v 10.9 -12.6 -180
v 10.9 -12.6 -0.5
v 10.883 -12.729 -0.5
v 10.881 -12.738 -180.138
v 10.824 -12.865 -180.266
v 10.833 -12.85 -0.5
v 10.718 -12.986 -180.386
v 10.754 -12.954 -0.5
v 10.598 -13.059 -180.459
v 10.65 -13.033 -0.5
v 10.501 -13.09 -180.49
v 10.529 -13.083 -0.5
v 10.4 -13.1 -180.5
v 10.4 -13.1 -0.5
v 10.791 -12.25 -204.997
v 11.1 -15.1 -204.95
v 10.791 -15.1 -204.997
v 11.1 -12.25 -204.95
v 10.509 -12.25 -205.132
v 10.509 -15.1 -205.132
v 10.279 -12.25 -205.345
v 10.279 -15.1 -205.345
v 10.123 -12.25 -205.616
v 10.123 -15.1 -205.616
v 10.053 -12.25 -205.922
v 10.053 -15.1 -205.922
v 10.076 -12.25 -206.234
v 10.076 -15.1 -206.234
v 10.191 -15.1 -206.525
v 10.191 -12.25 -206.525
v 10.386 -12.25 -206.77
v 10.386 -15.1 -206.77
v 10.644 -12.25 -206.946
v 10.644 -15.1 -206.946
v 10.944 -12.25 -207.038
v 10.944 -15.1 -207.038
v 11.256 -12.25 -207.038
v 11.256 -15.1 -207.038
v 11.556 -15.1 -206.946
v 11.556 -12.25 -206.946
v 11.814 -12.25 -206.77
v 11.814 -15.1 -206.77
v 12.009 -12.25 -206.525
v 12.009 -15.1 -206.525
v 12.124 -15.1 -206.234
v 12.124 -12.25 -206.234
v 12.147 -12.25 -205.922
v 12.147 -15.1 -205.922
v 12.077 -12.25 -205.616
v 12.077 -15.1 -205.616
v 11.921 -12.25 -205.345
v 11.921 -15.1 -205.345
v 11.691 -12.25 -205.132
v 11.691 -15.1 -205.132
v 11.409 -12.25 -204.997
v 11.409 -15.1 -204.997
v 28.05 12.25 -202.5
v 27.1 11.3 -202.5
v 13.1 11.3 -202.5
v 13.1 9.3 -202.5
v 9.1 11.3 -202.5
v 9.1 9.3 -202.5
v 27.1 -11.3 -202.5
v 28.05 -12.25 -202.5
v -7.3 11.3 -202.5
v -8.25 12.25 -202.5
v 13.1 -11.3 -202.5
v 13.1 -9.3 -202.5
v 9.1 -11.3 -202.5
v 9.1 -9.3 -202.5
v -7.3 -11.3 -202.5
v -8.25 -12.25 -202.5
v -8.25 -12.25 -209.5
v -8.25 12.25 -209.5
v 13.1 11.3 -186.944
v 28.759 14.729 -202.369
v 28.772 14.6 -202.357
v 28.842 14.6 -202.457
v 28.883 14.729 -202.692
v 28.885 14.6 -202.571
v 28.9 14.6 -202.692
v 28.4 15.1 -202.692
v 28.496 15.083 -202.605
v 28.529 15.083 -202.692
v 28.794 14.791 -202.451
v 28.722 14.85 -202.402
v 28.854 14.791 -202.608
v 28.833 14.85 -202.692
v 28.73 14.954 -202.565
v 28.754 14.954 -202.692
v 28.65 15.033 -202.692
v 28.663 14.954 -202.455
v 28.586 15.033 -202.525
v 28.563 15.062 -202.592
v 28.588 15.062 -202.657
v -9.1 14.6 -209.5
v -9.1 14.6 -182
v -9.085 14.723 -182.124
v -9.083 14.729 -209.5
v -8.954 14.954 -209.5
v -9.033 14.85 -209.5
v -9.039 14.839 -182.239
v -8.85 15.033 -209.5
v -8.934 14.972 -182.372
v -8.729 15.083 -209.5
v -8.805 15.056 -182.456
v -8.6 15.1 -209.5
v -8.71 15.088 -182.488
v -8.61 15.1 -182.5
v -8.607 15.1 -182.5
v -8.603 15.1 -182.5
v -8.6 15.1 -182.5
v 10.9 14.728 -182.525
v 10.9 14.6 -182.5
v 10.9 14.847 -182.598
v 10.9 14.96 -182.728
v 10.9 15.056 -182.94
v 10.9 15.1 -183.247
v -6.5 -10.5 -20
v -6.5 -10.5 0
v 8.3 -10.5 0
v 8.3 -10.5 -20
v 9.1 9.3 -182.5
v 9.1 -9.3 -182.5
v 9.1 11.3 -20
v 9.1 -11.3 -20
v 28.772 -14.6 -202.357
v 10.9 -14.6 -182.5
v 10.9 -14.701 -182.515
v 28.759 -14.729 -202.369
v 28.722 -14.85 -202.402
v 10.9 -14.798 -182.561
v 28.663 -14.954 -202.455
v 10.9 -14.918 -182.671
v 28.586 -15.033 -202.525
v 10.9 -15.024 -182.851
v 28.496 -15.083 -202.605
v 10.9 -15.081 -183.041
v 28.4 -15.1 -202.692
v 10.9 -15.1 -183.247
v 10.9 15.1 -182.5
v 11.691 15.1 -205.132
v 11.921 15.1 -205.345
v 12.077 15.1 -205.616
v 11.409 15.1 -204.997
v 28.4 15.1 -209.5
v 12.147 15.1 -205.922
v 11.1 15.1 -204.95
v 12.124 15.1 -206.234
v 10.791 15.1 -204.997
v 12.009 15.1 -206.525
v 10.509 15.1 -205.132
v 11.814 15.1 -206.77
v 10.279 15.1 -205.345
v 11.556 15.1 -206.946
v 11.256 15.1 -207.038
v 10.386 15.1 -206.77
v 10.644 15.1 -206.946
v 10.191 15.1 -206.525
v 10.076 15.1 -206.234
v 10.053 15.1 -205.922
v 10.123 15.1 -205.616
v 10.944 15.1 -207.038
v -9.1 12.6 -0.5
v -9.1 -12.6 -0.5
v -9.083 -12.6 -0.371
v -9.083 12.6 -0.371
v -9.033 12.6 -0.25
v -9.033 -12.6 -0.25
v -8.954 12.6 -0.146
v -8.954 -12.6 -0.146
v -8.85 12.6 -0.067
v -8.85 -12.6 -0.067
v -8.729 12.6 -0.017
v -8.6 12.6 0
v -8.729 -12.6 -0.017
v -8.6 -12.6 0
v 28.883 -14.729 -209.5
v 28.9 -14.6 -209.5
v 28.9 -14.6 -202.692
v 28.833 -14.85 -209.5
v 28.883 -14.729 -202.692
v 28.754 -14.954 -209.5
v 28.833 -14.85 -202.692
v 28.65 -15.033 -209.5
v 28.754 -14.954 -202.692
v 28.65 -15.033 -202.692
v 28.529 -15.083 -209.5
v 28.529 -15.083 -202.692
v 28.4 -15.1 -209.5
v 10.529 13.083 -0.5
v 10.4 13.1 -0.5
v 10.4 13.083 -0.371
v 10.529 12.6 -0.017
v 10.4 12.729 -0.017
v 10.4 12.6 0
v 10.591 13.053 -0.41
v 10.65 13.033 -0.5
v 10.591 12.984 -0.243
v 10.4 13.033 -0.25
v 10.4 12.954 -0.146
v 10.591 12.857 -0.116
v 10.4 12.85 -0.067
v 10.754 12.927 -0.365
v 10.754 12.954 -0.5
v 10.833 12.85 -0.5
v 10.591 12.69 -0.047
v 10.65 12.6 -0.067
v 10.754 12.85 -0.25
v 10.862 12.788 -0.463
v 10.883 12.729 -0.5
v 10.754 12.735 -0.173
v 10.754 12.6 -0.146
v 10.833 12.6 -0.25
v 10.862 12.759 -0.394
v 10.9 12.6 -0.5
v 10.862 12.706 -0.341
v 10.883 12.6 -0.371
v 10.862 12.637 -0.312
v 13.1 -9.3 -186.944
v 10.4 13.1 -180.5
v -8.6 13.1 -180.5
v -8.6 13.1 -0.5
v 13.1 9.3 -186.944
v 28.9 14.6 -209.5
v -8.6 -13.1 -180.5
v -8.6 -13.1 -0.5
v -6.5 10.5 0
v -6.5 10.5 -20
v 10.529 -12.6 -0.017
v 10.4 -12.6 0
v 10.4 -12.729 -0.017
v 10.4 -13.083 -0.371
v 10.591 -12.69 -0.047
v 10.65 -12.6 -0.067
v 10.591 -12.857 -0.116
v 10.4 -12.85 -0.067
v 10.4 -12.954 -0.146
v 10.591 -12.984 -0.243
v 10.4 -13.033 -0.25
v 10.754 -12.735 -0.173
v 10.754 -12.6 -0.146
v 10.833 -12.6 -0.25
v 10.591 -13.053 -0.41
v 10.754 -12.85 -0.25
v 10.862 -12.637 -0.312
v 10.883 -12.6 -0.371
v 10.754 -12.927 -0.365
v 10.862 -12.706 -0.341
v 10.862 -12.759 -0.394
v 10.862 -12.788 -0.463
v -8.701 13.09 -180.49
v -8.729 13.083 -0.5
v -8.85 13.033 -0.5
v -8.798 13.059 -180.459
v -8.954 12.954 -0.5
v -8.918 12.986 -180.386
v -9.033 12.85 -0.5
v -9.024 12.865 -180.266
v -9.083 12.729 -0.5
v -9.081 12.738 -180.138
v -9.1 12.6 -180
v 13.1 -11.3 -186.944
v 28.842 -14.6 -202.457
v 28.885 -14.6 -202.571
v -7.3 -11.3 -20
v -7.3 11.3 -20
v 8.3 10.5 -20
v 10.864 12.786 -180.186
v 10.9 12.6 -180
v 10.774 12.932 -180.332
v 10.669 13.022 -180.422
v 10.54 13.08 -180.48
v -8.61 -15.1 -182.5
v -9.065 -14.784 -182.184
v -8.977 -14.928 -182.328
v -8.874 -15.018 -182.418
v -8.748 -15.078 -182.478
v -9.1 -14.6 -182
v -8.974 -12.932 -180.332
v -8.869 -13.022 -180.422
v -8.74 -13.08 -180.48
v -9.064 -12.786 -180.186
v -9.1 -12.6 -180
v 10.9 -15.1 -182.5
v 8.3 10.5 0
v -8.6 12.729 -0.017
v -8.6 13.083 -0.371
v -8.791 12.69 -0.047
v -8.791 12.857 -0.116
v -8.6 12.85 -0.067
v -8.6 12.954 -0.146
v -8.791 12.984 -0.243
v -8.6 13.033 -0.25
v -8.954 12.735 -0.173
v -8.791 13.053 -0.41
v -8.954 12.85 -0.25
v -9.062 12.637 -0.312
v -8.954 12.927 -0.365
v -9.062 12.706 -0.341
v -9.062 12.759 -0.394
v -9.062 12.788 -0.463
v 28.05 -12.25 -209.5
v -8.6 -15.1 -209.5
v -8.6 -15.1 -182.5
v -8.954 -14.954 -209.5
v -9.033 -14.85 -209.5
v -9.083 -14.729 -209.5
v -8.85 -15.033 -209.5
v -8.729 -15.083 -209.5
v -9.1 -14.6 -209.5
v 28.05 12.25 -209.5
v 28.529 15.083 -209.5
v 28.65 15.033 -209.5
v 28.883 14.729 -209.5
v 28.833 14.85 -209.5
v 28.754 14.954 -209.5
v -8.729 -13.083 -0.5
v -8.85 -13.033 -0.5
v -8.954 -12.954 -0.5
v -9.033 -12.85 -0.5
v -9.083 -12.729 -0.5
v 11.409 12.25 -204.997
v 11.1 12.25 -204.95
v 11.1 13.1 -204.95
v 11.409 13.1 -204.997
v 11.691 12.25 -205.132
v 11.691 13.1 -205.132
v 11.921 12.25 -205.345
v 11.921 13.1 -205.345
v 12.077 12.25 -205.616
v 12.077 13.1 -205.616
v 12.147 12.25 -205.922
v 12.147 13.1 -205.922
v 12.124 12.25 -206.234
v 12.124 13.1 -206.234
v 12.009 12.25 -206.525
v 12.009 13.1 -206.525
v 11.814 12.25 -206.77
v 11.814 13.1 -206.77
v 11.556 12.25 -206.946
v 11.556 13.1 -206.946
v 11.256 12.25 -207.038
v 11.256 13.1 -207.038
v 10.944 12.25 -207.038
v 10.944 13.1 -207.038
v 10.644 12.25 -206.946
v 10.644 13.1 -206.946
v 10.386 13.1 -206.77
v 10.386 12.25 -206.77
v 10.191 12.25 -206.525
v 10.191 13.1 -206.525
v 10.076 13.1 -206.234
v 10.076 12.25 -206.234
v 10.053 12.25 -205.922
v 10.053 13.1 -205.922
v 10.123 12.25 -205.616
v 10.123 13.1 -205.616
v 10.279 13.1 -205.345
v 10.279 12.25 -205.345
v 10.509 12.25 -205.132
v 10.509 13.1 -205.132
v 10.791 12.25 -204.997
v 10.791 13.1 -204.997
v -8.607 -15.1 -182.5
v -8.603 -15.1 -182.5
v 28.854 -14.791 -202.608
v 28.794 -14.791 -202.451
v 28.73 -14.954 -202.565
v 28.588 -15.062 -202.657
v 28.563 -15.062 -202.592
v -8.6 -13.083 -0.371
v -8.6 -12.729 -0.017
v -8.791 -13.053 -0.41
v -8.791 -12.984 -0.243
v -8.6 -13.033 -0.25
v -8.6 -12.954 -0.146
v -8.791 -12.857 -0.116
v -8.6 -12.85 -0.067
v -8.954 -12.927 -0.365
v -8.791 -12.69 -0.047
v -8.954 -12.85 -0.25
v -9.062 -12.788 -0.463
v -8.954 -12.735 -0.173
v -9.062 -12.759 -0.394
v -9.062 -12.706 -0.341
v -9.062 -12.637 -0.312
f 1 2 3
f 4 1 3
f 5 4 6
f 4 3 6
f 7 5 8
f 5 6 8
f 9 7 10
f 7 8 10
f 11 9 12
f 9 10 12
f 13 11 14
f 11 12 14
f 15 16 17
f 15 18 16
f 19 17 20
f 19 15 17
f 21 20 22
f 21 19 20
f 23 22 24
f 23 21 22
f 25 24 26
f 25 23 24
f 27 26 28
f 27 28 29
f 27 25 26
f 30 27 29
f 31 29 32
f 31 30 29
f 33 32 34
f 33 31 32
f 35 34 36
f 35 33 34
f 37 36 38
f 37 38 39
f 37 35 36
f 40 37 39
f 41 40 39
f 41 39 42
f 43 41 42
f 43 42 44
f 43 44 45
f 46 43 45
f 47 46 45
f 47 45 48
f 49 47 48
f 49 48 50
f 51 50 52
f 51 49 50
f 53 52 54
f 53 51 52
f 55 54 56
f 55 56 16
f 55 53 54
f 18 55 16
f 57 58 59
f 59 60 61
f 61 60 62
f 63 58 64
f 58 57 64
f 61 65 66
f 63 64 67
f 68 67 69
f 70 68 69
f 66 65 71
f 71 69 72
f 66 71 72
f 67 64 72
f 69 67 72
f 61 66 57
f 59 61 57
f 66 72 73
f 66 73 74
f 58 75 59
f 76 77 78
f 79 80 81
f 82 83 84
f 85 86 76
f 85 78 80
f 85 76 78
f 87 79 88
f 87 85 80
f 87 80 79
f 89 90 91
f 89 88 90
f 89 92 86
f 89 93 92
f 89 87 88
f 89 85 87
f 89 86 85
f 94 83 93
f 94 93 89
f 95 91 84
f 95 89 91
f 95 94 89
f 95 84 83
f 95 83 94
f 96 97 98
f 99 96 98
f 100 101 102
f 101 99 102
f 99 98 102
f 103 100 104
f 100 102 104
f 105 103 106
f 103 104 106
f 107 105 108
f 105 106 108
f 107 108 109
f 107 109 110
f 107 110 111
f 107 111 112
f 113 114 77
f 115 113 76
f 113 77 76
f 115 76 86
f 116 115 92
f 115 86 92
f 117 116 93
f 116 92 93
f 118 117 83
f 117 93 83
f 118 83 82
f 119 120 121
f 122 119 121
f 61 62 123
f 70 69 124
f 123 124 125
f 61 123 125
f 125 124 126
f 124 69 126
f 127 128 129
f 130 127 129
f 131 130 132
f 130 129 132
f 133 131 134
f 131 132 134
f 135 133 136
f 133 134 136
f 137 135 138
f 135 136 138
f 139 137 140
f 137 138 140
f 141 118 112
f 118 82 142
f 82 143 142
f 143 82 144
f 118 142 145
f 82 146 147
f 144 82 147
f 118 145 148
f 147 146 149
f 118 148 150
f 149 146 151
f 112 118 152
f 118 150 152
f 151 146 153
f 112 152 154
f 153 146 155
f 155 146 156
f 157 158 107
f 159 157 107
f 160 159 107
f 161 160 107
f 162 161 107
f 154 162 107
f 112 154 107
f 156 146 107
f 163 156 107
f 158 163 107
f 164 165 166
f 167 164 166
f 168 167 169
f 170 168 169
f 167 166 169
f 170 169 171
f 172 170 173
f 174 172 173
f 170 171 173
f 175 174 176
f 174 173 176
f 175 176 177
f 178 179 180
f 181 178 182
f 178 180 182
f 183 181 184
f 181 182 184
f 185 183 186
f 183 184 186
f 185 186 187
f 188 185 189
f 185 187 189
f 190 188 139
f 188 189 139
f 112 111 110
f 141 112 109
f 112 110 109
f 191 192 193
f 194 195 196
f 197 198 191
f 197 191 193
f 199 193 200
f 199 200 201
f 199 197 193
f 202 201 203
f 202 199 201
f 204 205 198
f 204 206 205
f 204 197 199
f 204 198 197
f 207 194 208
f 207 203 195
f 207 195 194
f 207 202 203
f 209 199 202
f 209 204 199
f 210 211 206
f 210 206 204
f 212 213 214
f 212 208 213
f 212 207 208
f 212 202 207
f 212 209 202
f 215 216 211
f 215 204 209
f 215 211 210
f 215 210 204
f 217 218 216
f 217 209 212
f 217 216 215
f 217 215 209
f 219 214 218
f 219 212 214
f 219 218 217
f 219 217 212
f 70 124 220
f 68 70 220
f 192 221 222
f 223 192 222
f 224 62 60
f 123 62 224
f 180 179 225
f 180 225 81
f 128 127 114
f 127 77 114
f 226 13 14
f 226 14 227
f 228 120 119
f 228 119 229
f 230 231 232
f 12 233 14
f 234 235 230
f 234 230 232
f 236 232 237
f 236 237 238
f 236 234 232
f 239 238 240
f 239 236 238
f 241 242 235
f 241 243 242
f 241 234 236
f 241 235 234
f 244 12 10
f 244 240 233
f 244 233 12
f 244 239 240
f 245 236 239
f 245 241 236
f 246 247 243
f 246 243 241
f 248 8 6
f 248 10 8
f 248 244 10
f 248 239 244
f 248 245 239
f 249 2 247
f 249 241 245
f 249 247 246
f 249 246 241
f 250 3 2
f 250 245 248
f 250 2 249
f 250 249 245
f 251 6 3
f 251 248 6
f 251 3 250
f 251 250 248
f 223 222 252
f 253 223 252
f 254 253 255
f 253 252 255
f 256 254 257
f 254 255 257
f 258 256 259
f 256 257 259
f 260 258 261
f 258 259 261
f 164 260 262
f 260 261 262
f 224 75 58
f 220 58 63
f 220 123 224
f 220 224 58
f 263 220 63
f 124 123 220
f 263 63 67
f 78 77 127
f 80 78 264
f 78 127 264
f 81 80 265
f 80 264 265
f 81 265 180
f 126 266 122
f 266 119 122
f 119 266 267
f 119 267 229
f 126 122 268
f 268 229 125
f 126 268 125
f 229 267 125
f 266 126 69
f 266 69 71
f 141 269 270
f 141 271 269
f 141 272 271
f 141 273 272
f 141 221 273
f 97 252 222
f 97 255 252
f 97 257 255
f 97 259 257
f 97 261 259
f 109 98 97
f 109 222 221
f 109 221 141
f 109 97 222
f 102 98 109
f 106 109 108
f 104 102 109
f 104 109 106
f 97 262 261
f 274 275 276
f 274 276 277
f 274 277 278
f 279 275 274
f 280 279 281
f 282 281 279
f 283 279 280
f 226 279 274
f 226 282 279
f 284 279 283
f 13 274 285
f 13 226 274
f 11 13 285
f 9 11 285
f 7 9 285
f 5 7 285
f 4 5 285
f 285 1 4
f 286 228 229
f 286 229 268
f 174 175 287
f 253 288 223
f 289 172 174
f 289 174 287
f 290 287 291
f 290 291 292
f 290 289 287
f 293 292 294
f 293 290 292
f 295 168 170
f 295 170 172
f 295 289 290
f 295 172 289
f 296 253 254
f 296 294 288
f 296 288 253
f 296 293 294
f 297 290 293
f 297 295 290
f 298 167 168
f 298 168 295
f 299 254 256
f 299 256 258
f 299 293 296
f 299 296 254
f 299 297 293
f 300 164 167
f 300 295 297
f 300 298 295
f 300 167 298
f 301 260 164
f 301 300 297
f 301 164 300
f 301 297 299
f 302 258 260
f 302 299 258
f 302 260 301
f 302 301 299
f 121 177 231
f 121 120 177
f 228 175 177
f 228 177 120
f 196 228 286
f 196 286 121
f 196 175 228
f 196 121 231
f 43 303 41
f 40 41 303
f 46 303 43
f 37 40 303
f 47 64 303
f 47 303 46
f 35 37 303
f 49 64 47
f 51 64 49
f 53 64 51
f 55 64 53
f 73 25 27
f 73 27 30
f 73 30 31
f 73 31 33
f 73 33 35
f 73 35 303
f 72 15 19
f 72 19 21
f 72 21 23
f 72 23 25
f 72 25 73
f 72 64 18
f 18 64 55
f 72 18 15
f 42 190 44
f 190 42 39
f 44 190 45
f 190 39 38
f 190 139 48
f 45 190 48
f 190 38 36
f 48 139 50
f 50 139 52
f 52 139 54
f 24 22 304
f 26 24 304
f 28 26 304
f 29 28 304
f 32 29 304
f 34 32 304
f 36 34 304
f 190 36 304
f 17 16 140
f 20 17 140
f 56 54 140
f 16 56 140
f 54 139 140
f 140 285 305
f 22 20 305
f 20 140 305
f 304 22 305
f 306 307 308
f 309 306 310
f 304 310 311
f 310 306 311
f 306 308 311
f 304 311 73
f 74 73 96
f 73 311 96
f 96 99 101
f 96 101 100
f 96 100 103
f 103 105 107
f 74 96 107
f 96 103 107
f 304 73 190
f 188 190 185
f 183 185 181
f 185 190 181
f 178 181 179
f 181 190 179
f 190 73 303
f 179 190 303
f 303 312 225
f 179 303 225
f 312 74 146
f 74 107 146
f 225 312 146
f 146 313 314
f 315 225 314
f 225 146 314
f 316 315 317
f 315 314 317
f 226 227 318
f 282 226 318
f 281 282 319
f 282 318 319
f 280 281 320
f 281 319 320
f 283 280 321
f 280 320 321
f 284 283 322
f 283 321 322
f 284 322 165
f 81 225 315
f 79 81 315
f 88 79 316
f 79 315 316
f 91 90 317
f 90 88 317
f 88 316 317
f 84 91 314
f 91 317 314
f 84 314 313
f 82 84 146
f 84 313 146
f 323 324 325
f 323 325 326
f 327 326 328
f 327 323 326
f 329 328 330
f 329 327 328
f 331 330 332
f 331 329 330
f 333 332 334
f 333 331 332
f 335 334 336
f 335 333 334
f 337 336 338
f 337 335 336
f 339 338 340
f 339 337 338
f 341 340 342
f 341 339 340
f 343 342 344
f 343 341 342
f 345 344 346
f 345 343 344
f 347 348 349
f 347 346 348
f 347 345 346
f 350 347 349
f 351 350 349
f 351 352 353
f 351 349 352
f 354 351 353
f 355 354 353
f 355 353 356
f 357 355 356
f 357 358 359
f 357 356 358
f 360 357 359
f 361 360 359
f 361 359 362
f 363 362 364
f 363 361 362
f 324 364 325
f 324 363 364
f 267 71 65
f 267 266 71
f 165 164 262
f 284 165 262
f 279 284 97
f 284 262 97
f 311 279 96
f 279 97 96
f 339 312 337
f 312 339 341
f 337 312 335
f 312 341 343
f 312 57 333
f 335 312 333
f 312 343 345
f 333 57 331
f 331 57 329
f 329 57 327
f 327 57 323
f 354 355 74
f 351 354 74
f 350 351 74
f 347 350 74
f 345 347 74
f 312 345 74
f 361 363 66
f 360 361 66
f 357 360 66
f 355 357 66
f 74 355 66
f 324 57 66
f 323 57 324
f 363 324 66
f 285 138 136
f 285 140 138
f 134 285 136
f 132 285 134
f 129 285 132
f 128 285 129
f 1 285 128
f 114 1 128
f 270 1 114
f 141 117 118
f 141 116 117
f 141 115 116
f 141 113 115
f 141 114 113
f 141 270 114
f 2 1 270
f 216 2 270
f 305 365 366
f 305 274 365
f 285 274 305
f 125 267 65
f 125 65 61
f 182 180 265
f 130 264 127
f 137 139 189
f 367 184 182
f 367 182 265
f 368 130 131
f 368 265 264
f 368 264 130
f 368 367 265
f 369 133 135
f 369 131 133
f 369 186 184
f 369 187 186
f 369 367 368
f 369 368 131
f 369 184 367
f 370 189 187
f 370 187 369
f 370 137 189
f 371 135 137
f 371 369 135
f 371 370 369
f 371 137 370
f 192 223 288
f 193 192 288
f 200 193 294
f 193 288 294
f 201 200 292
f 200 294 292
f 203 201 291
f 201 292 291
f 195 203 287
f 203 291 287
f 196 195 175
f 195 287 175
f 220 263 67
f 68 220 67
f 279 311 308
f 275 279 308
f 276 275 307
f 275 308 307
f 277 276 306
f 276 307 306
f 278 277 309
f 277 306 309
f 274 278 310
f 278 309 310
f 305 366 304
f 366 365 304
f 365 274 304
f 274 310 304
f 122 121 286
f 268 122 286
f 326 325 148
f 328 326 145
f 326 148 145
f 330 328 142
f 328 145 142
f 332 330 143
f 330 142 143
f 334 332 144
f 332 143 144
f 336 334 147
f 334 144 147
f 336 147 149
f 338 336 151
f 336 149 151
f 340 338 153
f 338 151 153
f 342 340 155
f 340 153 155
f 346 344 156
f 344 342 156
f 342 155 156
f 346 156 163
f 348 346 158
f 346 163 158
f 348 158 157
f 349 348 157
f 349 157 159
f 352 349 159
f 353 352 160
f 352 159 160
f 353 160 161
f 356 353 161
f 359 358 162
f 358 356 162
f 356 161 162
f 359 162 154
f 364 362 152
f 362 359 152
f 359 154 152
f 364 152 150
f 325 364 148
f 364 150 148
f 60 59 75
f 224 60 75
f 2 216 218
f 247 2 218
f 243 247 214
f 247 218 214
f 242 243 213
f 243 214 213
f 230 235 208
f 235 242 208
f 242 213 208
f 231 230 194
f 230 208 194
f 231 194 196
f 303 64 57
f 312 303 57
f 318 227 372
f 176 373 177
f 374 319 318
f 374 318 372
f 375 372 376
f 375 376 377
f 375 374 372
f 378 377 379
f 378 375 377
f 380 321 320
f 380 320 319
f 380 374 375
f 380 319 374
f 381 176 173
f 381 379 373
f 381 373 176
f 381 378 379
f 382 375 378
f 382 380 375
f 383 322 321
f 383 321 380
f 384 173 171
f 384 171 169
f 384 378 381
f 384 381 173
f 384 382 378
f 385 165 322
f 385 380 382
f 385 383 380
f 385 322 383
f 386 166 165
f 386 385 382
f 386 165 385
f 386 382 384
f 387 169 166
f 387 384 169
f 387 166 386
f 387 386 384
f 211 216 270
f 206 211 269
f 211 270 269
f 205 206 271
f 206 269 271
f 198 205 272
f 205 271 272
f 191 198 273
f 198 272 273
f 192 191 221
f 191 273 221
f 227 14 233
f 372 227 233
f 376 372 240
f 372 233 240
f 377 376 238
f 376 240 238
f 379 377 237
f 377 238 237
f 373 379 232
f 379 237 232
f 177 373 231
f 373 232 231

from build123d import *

# Parameters (mm, degrees)
SKETCH1_W               = 20
SKETCH1_H               = 26.2
SKETCH1_W_2             = 14.8
SKETCH1_H_2             = 21
TOP_DEPTH               = 20
SKETCH2_W               = 20
SKETCH2_H               = 26.2
SKETCH2_W_2             = 16.4
SKETCH2_H_2             = 22.6
BODY_DEPTH              = 162.5
SKETCH13_W              = 38
SKETCH13_H              = 26.2
SKETCH13_W_2            = 36.3
SKETCH13_H_2            = 24.5
INSERT_DEPTH            = 7
CUT_EXTRUDE1_DEPTH      = 212.889287248
CUT_EXTRUDE1_DEPTH_BACK = 212.889287248
SKETCH15_R              = 1.05
BOSS_EXTRUDE1_DEPTH     = 2
BOSS_EXTRUDE2_DEPTH     = 2
SKETCH19_R              = 1.05
BOSS_EXTRUDE3_DEPTH     = 2
BOSS_EXTRUDE4_START     = 2
SKETCH20_R              = 1.05
BOSS_EXTRUDE4_DEPTH     = 2
CHAMFER1_SIZE           = 2
FILLET1_R               = 0.5


# Some blends are built 0.0001 mm under size
with BuildPart() as part:
    # Sketch1 → Top (new body)
    with BuildSketch(Plane.XY):
        with Locations((0.9, 0)):
            Rectangle(SKETCH1_W, SKETCH1_H)
        with Locations((0.9, 0)):
            Rectangle(SKETCH1_W_2, SKETCH1_H_2, mode=Mode.SUBTRACT)
    extrude(amount=-TOP_DEPTH)

    # Sketch2 → Body (add)
    with BuildSketch(Plane(origin=(0, 0, -20), x_dir=(-1, 0, 0), z_dir=(0, 0, -1))):
        with Locations((-0.9, 0)):
            Rectangle(SKETCH2_W, SKETCH2_H)
        with Locations((-0.9, 0)):
            Rectangle(SKETCH2_W_2, SKETCH2_H_2, mode=Mode.SUBTRACT)
    extrude(amount=BODY_DEPTH)

    # Sketch10 → Loft3 section 0
    with BuildSketch(Plane(origin=(0, 0, -202.5), x_dir=(-1, 0, 0), z_dir=(0, 0, -1))):
        with BuildLine():
            Line((-28.9, -13.1), (9.1, -13.1))
            Line((9.1, -13.1), (9.1, 13.1))
            Line((9.1, 13.1), (-28.9, 13.1))
            Line((-28.9, 13.1), (-28.9, -13.1))
        make_face()
    # Sketch8 → Loft3 section 1
    with BuildSketch(Plane(origin=(0, 0, -182.5), x_dir=(-1, 0, 0), z_dir=(0, 0, -1))):
        with BuildLine():
            Line((9.1, 13.1), (-10.9, 13.1))
            Line((-10.9, 13.1), (-10.9, -13.1))
            Line((-10.9, -13.1), (9.1, -13.1))
            Line((9.1, -13.1), (9.1, 13.1))
        make_face()
    loft()

    # Sketch12 → Cut-Loft1 section 0
    with BuildSketch(Plane(origin=(0, 0, -202.5), x_dir=(-1, 0, 0), z_dir=(0, 0, -1))):
        with BuildLine():
            Line((7.3, -11.3), (7.3, 11.3))
            Line((7.3, 11.3), (-27.1, 11.3))
            Line((-27.1, 11.3), (-27.1, -11.3))
            Line((-27.1, -11.3), (7.3, -11.3))
        make_face()
    # Sketch11 → Cut-Loft1 section 1
    with BuildSketch(Plane(origin=(0, 0, -182.5), x_dir=(-1, 0, 0), z_dir=(0, 0, -1))):
        with BuildLine():
            Line((-9.1, 11.3), (-9.1, -11.3))
            Line((-9.1, -11.3), (7.3, -11.3))
            Line((7.3, -11.3), (7.3, 11.3))
            Line((7.3, 11.3), (-9.1, 11.3))
        make_face()
    loft(mode=Mode.SUBTRACT)

    # Sketch13 → Insert (add)
    with BuildSketch(Plane(origin=(0, 0, -202.5), x_dir=(-1, 0, 0), z_dir=(0, 0, -1))):
        with Locations((-9.9, 0)):
            Rectangle(SKETCH13_W, SKETCH13_H)
        with Locations((-9.9, 0)):
            Rectangle(SKETCH13_W_2, SKETCH13_H_2, mode=Mode.SUBTRACT)
    extrude(amount=INSERT_DEPTH)

    # Sketch15 → Cut-Extrude1 (cut, two sides: drawn at the far end of the back side and taken through both)
    with BuildSketch(Plane(origin=(0, 0, 0), x_dir=(1, 0, 0), z_dir=(0, 1, 0)).offset(-CUT_EXTRUDE1_DEPTH_BACK)):
        with Locations(Location((11.1, 206, 0), (0, 0, 270))):
            Circle(SKETCH15_R)
    extrude(amount=CUT_EXTRUDE1_DEPTH + CUT_EXTRUDE1_DEPTH_BACK, mode=Mode.SUBTRACT)

    # Sketch17 → Boss-Extrude1 (add)
    with BuildSketch(Plane.XZ.offset(-11.3)):
        Polygon((13.1, -202.5), (13.1, -186.944444444), (9.1, -182.5), (9.1, -202.5), align=None)
    extrude(amount=BOSS_EXTRUDE1_DEPTH)

    # Sketch18 → Boss-Extrude2 (add)
    with BuildSketch(Plane(origin=(0, -11.3, 0), x_dir=(1, 0, 0), z_dir=(0, 1, 0))):
        Polygon((13.1, 202.5), (9.1, 202.5), (9.1, 182.5), (13.1, 186.944444444), align=None)
    extrude(amount=BOSS_EXTRUDE2_DEPTH)

    # Sketch19 → Boss-Extrude3 (add)
    with BuildSketch(Plane.XZ.offset(13.1)):
        Polygon((28.9, -209.5), (-9.1, -209.5), (-9.1, -182.5), (10.9, -182.5), (28.9, -202.5), align=None)
        with Locations(Location((11.1, -206, 0), (0, 0, 90))):
            Circle(SKETCH19_R, mode=Mode.SUBTRACT)
    extrude(amount=BOSS_EXTRUDE3_DEPTH)

    # Sketch20 → Boss-Extrude4 (add)
    with BuildSketch(Plane(origin=(0, 13.1, 0), x_dir=(1, 0, 0), z_dir=(0, 1, 0)).offset(BOSS_EXTRUDE4_START)):
        Polygon((-9.1, 209.5), (28.9, 209.5), (28.9, 202.5), (10.9, 182.5), (-9.1, 182.5), align=None)
        with Locations(Location((11.1, 206, 0), (0, 0, 270))):
            Circle(SKETCH20_R, mode=Mode.SUBTRACT)
    extrude(amount=-BOSS_EXTRUDE4_DEPTH)

    # Chamfer1
    chamfer1_edges = [part.edges().sort_by_distance(p)[0] for p in [
        (0.9, 13.1, -182.5),
        (0.9, -13.1, -182.5),
    ]]
    chamfer(chamfer1_edges, length=CHAMFER1_SIZE - 0.0001)  # a hair under: the kernel refuses the full size

    # Fillet1
    # the kernel refuses this fillet: 0.5 mm, written as the material it takes off along each edge
    with BuildSketch(Plane(origin=(28.4, -14.6, -202.691868003), x_dir=(0.7432941462471656, 0, 0.6689647316224505), z_dir=(0, -1, 0))) as fillet1_piece_1_section:
        Polygon((0, 0), (FILLET1_R * 1.02, 0), (FILLET1_R * 1.02, -FILLET1_R * 0.391410725335), (FILLET1_R * 0.758160029172, -FILLET1_R * 0.682344026255), align=None)
    fillet1_piece_1 = extrude(amount=FILLET1_R * 1.02, mode=Mode.PRIVATE)
    fillet1_piece_1 = fillet1_piece_1 - Plane(origin=(28.4, -14.6, -202.691868003), x_dir=(-0.9336204116896668, 0, -0.3582637671833662), z_dir=(0, -1, 0)) * Sphere(FILLET1_R, mode=Mode.PRIVATE)
    add(fillet1_piece_1, mode=Mode.SUBTRACT)
    with BuildSketch(Plane(origin=(28.4, 14.6, -202.691868003), x_dir=(1, 0, 0), z_dir=(0, 1, 0))) as fillet1_piece_2_section:
        Polygon((0, 0), (FILLET1_R * 1.02, 0), (FILLET1_R * 1.02, -FILLET1_R * 0.391410725335), (FILLET1_R * 0.758160029172, -FILLET1_R * 0.682344026255), align=None)
    fillet1_piece_2 = extrude(amount=FILLET1_R * 1.02, mode=Mode.PRIVATE)
    fillet1_piece_2 = fillet1_piece_2 - Plane(origin=(28.4, 14.6, -202.691868003), x_dir=(-0.9336204116896668, 0, -0.3582637671833662), z_dir=(0, 1, 0)) * Sphere(FILLET1_R, mode=Mode.PRIVATE)
    add(fillet1_piece_2, mode=Mode.SUBTRACT)
    with BuildSketch(Plane(origin=(10.4, -12.6, -0.5), x_dir=(0, -1, 0), z_dir=(1, 0, 0))) as fillet1_piece_3_section:
        Polygon((0, 0), (FILLET1_R * 1.02, 0), (FILLET1_R * 1.02, -FILLET1_R * 1.02), (0, -FILLET1_R * 1.02), align=None)
    fillet1_piece_3 = extrude(amount=FILLET1_R * 1.02, mode=Mode.PRIVATE)
    fillet1_piece_3 = fillet1_piece_3 - Plane(origin=(10.4, -12.6, -0.5), x_dir=(0, 0.7071067811865475, -0.7071067811865475), z_dir=(1, 0, 0)) * Sphere(FILLET1_R, mode=Mode.PRIVATE)
    add(fillet1_piece_3, mode=Mode.SUBTRACT)
    with BuildSketch(Plane(origin=(-8.6, -12.6, -0.5), x_dir=(0, -1, 0), z_dir=(-1, 0, 0))) as fillet1_piece_4_section:
        Polygon((0, 0), (FILLET1_R * 1.02, 0), (FILLET1_R * 1.02, FILLET1_R * 1.02), (0, FILLET1_R * 1.02), align=None)
    fillet1_piece_4 = extrude(amount=FILLET1_R * 1.02, mode=Mode.PRIVATE)
    fillet1_piece_4 = fillet1_piece_4 - Plane(origin=(-8.6, -12.6, -0.5), x_dir=(0, 0.7071067811865475, -0.7071067811865475), z_dir=(-1, 0, 0)) * Sphere(FILLET1_R, mode=Mode.PRIVATE)
    add(fillet1_piece_4, mode=Mode.SUBTRACT)
    with BuildSketch(Plane(origin=(-8.6, 12.6, -0.5), x_dir=(0, 0, 1), z_dir=(-1, 0, 0))) as fillet1_piece_5_section:
        Polygon((0, 0), (FILLET1_R * 1.02, 0), (FILLET1_R * 1.02, FILLET1_R * 1.02), (0, FILLET1_R * 1.02), align=None)
    fillet1_piece_5 = extrude(amount=FILLET1_R * 1.02, mode=Mode.PRIVATE)
    fillet1_piece_5 = fillet1_piece_5 - Plane(origin=(-8.6, 12.6, -0.5), x_dir=(0, -0.7071067811865475, -0.7071067811865475), z_dir=(-1, 0, 0)) * Sphere(FILLET1_R, mode=Mode.PRIVATE)
    add(fillet1_piece_5, mode=Mode.SUBTRACT)
    with BuildSketch(Plane(origin=(10.4, 12.6, -0.5), x_dir=(0, 0, 1), z_dir=(1, 0, 0))) as fillet1_piece_6_section:
        Polygon((0, 0), (FILLET1_R * 1.02, 0), (FILLET1_R * 1.02, -FILLET1_R * 1.02), (0, -FILLET1_R * 1.02), align=None)
    fillet1_piece_6 = extrude(amount=FILLET1_R * 1.02, mode=Mode.PRIVATE)
    fillet1_piece_6 = fillet1_piece_6 - Plane(origin=(10.4, 12.6, -0.5), x_dir=(0, -0.7071067811865475, -0.7071067811865475), z_dir=(1, 0, 0)) * Sphere(FILLET1_R, mode=Mode.PRIVATE)
    add(fillet1_piece_6, mode=Mode.SUBTRACT)
    with BuildSketch(Plane(origin=(28.9, -15.1, -202.691868003), x_dir=(0, 1, 0), z_dir=(0, 0, -1))) as fillet1_piece_7:
        with BuildLine():
            CenterArc((FILLET1_R, -FILLET1_R), FILLET1_R, 90, 90)
            Line((0, -FILLET1_R), (0, 0))
            Line((0, 0), (FILLET1_R, 0))
        make_face()
    extrude(amount=8.058131997, mode=Mode.SUBTRACT)
    with BuildSketch(Plane(origin=(10.063794085, -15.1, -181.570882317), x_dir=(-0.7432941462471663, 0, -0.6689647316224498), z_dir=(0.6689647316224498, 0, -0.7432941462471663))) as fillet1_piece_8_section:
        with BuildLine():
            CenterArc((FILLET1_R, FILLET1_R), FILLET1_R, 180, 90)
            Line((0, FILLET1_R), (0, 0))
            Line((0, 0), (FILLET1_R, 0))
        make_face()
    fillet1_piece_8 = extrude(amount=27.965380092, mode=Mode.PRIVATE)
    fillet1_piece_8 = split(fillet1_piece_8, bisect_by=Plane(origin=(10.9, -14.988099969, -192.54912701), z_dir=(1, 0, 0)), keep=Keep.TOP, mode=Mode.PRIVATE)
    add(fillet1_piece_8, mode=Mode.SUBTRACT)
    with BuildSketch(Plane(origin=(-9.1, -15.1, -210.75), x_dir=(1, 0, 0), z_dir=(0, 0, 1)), Plane(origin=(-9.1, 15.1, -181.25), x_dir=(1, 0, 0), z_dir=(0, 0, -1))) as fillet1_piece_9:
        with BuildLine():
            CenterArc((FILLET1_R, FILLET1_R), FILLET1_R, 180, 90)
            Line((0, FILLET1_R), (0, 0))
            Line((0, 0), (FILLET1_R, 0))
        make_face()
    extrude(amount=29.5, mode=Mode.SUBTRACT)
    with BuildSketch(Plane(origin=(28.9, -14.6, -202.5), x_dir=(0, 0, -1), z_dir=(0, 1, 0))) as fillet1_piece_10:
        with BuildLine():
            CenterArc((FILLET1_R * 0.38373600523, FILLET1_R), FILLET1_R, 228.012787504, 41.987212496)
            Line((-FILLET1_R * 0.285228726392, FILLET1_R * 0.256705853753), (0, 0))
            Line((0, 0), (FILLET1_R * 0.38373600523, 0))
        make_face()
    extrude(amount=29.2, mode=Mode.SUBTRACT)
    with BuildSketch(Plane(origin=(28.771647073, 15.1, -202.357385637), x_dir=(-0.7432941462471662, 0, -0.66896473162245), z_dir=(-0.66896473162245, 0, 0.743294146247166))) as fillet1_piece_11_section:
        with BuildLine():
            CenterArc((FILLET1_R, FILLET1_R), FILLET1_R, 180, 90)
            Line((0, FILLET1_R), (0, 0))
            Line((0, 0), (FILLET1_R, 0))
        make_face()
    fillet1_piece_11 = extrude(amount=27.965380092, mode=Mode.PRIVATE)
    fillet1_piece_11 = split(fillet1_piece_11, bisect_by=Plane(origin=(10.9, 14.988099969, -192.54912701), z_dir=(1, 0, 0)), keep=Keep.TOP, mode=Mode.PRIVATE)
    add(fillet1_piece_11, mode=Mode.SUBTRACT)
    with BuildSketch(Plane(origin=(28.9, 15.1, -210.75), x_dir=(-1, 0, 0), z_dir=(0, 0, 1))) as fillet1_piece_12:
        with BuildLine():
            CenterArc((FILLET1_R, FILLET1_R), FILLET1_R, 180, 90)
            Line((0, FILLET1_R), (0, 0))
            Line((0, 0), (FILLET1_R, 0))
        make_face()
    extrude(amount=8.058131997, mode=Mode.SUBTRACT)
    with BuildSketch(Plane(origin=(10.9, -13.1, -0.5), x_dir=(0, 1, 0), z_dir=(0, 0, -1))) as fillet1_piece_13_section:
        with BuildLine():
            CenterArc((FILLET1_R, -FILLET1_R), FILLET1_R, 90, 90)
            Line((0, -FILLET1_R), (0, 0))
            Line((0, 0), (FILLET1_R, 0))
        make_face()
    fillet1_piece_13 = extrude(amount=181.2501, mode=Mode.PRIVATE)
    fillet1_piece_13 = split(fillet1_piece_13, bisect_by=Plane(origin=(10.788287286, 31.983751331, -135.416348669), z_dir=(2.2498580104233527e-15, -0.7071067811865469, 0.7071067811865481)), keep=Keep.TOP, mode=Mode.PRIVATE)
    add(fillet1_piece_13, mode=Mode.SUBTRACT)
    with BuildSketch(Plane(origin=(-9.1, -13.1, -0.5), x_dir=(0, 1, 0), z_dir=(0, 0, -1))) as fillet1_piece_14_section:
        with BuildLine():
            CenterArc((FILLET1_R, FILLET1_R), FILLET1_R, 180, 90)
            Line((0, FILLET1_R), (0, 0))
            Line((0, 0), (FILLET1_R, 0))
        make_face()
    fillet1_piece_14 = extrude(amount=181.2501, mode=Mode.PRIVATE)
    fillet1_piece_14 = split(fillet1_piece_14, bisect_by=Plane(origin=(-8.988287286, 31.983751331, -135.416348669), z_dir=(2.2498580104233527e-15, -0.7071067811865469, 0.7071067811865481)), keep=Keep.TOP, mode=Mode.PRIVATE)
    add(fillet1_piece_14, mode=Mode.SUBTRACT)
    with BuildSketch(Plane(origin=(-9.1, 13.1, -181.7501), x_dir=(0, -1, 0), z_dir=(0, 0, 1))) as fillet1_piece_15_section:
        with BuildLine():
            CenterArc((FILLET1_R, FILLET1_R), FILLET1_R, 180, 90)
            Line((0, FILLET1_R), (0, 0))
            Line((0, 0), (FILLET1_R, 0))
        make_face()
    fillet1_piece_15 = extrude(amount=181.2501, mode=Mode.PRIVATE)
    fillet1_piece_15 = split(fillet1_piece_15, bisect_by=Plane(origin=(-8.988287286, -31.983751331, -135.416348669), z_dir=(0, 0.7071067811865469, 0.7071067811865482)), keep=Keep.TOP, mode=Mode.PRIVATE)
    add(fillet1_piece_15, mode=Mode.SUBTRACT)
    with BuildSketch(Plane(origin=(10.9, 13.1, -181.7501), x_dir=(0, -1, 0), z_dir=(0, 0, 1))) as fillet1_piece_16_section:
        with BuildLine():
            CenterArc((FILLET1_R, -FILLET1_R), FILLET1_R, 90, 90)
            Line((0, -FILLET1_R), (0, 0))
            Line((0, 0), (FILLET1_R, 0))
        make_face()
    fillet1_piece_16 = extrude(amount=181.2501, mode=Mode.PRIVATE)
    fillet1_piece_16 = split(fillet1_piece_16, bisect_by=Plane(origin=(10.788287286, -31.983751331, -135.416348669), z_dir=(0, 0.7071067811865469, 0.7071067811865482)), keep=Keep.TOP, mode=Mode.PRIVATE)
    add(fillet1_piece_16, mode=Mode.SUBTRACT)
    with BuildSketch(Plane(origin=(-8.6, 13.1, 0), x_dir=(0, -1, 0), z_dir=(1, 0, 0)), Plane(origin=(10.4, -13.1, 0), x_dir=(0, 1, 0), z_dir=(-1, 0, 0))) as fillet1_piece_17:
        with BuildLine():
            CenterArc((FILLET1_R, FILLET1_R), FILLET1_R, 180, 90)
            Line((0, FILLET1_R), (0, 0))
            Line((0, 0), (FILLET1_R, 0))
        make_face()
    extrude(amount=19, mode=Mode.SUBTRACT)
    with BuildSketch(Plane(origin=(10.9, 12.6, 0), x_dir=(0, 0, -1), z_dir=(0, -1, 0))) as fillet1_piece_18:
        with BuildLine():
            CenterArc((FILLET1_R, -FILLET1_R), FILLET1_R, 90, 90)
            Line((0, -FILLET1_R), (0, 0))
            Line((0, 0), (FILLET1_R, 0))
        make_face()
    extrude(amount=25.2, mode=Mode.SUBTRACT)
    with BuildSketch(Plane(origin=(-9.1, -12.6, 0), x_dir=(1, 0, 0), z_dir=(0, 1, 0))) as fillet1_piece_19:
        with BuildLine():
            CenterArc((FILLET1_R, FILLET1_R), FILLET1_R, 180, 90)
            Line((0, FILLET1_R), (0, 0))
            Line((0, 0), (FILLET1_R, 0))
        make_face()
    extrude(amount=25.2, mode=Mode.SUBTRACT)


solid = part.part
